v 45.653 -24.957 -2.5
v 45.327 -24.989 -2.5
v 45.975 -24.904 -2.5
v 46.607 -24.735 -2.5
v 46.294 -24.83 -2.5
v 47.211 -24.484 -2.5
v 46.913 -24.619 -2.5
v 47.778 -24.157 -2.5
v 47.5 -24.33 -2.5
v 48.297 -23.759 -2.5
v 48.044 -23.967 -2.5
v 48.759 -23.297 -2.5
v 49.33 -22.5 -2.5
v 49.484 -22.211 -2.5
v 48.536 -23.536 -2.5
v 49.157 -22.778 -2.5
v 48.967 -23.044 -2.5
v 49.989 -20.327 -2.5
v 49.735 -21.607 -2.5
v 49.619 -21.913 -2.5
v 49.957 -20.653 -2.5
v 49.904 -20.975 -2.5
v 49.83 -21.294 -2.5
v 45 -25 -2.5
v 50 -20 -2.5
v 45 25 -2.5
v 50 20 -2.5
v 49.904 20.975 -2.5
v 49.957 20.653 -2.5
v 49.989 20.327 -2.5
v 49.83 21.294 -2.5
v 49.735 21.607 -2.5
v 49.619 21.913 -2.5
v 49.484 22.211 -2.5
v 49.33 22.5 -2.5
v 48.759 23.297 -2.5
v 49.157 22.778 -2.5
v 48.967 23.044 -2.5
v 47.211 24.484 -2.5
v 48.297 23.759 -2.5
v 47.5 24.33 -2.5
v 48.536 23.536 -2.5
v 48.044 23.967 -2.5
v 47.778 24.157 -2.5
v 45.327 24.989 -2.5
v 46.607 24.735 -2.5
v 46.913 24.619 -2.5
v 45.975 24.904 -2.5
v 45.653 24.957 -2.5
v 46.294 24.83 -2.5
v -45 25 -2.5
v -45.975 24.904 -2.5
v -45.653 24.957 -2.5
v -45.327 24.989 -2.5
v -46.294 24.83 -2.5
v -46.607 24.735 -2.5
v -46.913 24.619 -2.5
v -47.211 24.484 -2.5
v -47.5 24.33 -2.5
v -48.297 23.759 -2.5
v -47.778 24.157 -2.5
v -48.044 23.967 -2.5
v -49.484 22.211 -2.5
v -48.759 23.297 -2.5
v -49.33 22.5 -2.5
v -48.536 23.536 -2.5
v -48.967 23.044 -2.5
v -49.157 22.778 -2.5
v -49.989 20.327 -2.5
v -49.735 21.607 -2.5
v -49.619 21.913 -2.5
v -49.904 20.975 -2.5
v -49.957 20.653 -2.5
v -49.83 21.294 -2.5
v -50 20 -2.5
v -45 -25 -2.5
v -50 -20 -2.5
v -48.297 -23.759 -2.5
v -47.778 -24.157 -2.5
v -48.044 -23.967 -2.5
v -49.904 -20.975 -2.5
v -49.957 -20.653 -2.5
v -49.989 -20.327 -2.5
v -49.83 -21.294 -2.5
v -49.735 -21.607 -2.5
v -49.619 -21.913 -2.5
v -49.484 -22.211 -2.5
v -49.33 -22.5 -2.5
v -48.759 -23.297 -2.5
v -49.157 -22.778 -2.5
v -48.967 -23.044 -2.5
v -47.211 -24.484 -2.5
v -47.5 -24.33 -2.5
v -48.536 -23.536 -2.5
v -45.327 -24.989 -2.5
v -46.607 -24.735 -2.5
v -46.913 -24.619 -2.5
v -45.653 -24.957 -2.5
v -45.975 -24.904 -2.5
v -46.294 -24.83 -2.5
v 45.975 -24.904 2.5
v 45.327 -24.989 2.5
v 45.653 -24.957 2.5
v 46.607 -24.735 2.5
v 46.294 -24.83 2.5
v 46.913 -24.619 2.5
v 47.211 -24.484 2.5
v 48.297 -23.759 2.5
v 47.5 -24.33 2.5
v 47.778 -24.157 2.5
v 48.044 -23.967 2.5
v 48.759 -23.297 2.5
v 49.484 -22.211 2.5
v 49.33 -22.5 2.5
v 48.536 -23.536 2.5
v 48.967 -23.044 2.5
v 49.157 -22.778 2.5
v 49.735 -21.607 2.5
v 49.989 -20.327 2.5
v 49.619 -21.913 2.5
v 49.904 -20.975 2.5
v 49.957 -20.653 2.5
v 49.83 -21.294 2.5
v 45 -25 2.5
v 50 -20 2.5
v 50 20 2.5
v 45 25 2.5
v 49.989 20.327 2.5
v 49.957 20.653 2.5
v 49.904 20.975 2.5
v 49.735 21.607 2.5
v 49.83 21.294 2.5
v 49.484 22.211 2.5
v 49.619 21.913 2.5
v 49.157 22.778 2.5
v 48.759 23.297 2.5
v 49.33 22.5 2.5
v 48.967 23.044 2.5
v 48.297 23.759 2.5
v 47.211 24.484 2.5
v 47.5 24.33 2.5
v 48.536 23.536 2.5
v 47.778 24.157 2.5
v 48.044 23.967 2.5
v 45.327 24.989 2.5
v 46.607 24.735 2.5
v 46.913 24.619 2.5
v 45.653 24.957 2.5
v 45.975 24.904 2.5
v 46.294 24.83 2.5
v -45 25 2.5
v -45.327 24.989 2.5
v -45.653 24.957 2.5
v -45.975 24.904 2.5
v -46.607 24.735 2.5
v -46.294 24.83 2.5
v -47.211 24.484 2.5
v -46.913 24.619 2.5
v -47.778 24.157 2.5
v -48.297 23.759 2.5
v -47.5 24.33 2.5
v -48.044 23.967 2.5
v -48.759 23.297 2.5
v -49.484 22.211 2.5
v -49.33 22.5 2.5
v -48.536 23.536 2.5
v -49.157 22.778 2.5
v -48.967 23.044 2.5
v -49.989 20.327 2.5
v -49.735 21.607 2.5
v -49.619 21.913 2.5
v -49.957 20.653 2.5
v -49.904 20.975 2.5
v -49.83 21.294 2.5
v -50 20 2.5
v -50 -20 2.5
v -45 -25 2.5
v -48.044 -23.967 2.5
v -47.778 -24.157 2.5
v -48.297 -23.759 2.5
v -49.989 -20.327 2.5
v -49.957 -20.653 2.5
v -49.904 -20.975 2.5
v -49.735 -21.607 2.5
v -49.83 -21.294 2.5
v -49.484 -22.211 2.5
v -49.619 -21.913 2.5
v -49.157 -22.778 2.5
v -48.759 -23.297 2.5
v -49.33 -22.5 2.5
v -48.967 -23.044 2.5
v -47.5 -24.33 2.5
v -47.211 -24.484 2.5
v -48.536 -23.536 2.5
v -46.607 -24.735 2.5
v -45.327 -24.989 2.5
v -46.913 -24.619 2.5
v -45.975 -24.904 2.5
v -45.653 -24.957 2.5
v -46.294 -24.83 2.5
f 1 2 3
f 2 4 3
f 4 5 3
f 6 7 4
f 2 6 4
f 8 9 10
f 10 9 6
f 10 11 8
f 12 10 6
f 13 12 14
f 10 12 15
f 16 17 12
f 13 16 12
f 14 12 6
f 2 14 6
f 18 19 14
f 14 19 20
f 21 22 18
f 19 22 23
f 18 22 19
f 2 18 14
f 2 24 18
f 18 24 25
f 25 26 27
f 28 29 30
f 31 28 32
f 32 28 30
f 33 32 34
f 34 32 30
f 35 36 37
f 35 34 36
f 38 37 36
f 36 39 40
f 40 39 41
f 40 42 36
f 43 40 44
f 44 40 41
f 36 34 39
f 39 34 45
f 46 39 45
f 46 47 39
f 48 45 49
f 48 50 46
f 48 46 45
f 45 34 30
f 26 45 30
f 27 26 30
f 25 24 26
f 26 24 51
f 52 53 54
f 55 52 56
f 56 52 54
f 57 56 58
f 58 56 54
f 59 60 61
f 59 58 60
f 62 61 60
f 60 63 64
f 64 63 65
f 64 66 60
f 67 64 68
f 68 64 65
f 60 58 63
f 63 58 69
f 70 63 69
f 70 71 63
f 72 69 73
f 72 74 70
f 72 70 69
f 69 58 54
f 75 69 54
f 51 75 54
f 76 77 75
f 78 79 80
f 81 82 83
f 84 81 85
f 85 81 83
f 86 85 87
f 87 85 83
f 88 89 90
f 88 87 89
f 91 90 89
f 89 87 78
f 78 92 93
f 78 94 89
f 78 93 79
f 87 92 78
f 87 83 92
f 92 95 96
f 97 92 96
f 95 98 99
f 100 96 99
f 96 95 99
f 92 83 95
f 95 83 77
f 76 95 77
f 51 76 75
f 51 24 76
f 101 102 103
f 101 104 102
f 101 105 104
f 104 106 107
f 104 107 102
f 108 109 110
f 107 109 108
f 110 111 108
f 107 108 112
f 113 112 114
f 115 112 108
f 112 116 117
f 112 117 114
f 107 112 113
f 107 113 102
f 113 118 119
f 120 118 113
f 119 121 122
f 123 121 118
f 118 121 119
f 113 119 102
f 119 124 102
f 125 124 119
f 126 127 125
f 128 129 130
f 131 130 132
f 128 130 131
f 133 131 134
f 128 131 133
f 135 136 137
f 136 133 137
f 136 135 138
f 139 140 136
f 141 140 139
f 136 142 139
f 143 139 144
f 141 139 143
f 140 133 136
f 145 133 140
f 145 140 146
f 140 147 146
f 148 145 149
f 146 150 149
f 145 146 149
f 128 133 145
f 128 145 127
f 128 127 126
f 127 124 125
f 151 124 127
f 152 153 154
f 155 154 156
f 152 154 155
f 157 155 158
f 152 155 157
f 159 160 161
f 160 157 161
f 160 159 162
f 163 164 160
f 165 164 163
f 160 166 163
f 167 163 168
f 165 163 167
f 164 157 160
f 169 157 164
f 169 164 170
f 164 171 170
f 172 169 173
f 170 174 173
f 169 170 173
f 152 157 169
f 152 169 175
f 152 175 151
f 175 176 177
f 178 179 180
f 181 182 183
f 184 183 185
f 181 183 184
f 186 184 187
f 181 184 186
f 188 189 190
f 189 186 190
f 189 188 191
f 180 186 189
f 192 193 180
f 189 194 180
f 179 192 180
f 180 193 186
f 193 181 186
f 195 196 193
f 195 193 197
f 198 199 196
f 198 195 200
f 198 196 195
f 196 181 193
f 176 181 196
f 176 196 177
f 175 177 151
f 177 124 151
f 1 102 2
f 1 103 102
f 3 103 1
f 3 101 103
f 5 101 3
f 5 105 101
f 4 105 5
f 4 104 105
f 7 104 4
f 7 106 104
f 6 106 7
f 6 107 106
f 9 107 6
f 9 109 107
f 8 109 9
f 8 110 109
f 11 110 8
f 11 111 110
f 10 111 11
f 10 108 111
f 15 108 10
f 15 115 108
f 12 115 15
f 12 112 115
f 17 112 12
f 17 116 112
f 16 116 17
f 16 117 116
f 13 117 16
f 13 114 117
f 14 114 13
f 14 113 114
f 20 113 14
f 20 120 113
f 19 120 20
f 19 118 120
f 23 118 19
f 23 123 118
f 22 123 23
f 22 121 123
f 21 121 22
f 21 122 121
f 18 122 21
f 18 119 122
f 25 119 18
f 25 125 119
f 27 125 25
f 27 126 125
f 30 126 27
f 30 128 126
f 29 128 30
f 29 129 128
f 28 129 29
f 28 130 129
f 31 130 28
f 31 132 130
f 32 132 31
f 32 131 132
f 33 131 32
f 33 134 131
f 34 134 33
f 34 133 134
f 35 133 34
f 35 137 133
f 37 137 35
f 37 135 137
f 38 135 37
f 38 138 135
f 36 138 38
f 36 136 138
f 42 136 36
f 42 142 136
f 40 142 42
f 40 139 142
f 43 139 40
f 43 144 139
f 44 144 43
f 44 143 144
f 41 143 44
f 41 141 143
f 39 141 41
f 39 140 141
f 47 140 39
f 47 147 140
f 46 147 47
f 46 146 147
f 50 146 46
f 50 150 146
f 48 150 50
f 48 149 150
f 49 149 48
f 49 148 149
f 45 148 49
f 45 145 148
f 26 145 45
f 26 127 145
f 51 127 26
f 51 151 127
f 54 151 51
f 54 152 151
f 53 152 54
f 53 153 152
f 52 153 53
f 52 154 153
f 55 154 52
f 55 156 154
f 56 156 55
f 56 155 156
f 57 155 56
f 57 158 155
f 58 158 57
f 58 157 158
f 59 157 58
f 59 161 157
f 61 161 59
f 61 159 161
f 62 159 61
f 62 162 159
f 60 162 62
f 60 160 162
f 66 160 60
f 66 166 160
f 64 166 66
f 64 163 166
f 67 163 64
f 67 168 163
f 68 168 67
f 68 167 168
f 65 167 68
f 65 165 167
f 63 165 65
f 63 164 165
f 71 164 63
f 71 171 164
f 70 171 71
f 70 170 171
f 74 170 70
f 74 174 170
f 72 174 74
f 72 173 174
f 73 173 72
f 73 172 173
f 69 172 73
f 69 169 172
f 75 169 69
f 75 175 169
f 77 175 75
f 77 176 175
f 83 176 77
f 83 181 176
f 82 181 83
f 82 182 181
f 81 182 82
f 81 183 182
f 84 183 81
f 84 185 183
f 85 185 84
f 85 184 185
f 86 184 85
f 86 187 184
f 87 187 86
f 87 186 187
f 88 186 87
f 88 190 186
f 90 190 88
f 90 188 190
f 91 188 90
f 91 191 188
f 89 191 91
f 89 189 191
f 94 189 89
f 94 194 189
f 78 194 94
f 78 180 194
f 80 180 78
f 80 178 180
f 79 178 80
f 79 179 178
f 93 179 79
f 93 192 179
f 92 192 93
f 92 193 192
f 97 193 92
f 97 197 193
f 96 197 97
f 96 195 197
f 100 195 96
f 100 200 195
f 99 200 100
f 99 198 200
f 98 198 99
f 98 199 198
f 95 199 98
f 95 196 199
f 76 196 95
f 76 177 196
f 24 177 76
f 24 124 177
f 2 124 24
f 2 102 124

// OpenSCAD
$fn = 96;

module acrylic_sheet(length=100, width=50, thickness=5, corner_radius=5) {
    // Clamp radius so geometry never inverts/vanishes
    r = min(corner_radius, length/2 - 0.01, width/2 - 0.01);

    // 2D rounded rectangle, then extrude to a single connected solid
    color([0.85, 0.95, 1.0, 0.25])  // acrylic-like translucency (preview/render)
    linear_extrude(height=thickness, center=true, convexity=10)
        offset(r=r)
            square([length - 2*r, width - 2*r], center=true);
}

acrylic_sheet(100, 50, 5, 5);
